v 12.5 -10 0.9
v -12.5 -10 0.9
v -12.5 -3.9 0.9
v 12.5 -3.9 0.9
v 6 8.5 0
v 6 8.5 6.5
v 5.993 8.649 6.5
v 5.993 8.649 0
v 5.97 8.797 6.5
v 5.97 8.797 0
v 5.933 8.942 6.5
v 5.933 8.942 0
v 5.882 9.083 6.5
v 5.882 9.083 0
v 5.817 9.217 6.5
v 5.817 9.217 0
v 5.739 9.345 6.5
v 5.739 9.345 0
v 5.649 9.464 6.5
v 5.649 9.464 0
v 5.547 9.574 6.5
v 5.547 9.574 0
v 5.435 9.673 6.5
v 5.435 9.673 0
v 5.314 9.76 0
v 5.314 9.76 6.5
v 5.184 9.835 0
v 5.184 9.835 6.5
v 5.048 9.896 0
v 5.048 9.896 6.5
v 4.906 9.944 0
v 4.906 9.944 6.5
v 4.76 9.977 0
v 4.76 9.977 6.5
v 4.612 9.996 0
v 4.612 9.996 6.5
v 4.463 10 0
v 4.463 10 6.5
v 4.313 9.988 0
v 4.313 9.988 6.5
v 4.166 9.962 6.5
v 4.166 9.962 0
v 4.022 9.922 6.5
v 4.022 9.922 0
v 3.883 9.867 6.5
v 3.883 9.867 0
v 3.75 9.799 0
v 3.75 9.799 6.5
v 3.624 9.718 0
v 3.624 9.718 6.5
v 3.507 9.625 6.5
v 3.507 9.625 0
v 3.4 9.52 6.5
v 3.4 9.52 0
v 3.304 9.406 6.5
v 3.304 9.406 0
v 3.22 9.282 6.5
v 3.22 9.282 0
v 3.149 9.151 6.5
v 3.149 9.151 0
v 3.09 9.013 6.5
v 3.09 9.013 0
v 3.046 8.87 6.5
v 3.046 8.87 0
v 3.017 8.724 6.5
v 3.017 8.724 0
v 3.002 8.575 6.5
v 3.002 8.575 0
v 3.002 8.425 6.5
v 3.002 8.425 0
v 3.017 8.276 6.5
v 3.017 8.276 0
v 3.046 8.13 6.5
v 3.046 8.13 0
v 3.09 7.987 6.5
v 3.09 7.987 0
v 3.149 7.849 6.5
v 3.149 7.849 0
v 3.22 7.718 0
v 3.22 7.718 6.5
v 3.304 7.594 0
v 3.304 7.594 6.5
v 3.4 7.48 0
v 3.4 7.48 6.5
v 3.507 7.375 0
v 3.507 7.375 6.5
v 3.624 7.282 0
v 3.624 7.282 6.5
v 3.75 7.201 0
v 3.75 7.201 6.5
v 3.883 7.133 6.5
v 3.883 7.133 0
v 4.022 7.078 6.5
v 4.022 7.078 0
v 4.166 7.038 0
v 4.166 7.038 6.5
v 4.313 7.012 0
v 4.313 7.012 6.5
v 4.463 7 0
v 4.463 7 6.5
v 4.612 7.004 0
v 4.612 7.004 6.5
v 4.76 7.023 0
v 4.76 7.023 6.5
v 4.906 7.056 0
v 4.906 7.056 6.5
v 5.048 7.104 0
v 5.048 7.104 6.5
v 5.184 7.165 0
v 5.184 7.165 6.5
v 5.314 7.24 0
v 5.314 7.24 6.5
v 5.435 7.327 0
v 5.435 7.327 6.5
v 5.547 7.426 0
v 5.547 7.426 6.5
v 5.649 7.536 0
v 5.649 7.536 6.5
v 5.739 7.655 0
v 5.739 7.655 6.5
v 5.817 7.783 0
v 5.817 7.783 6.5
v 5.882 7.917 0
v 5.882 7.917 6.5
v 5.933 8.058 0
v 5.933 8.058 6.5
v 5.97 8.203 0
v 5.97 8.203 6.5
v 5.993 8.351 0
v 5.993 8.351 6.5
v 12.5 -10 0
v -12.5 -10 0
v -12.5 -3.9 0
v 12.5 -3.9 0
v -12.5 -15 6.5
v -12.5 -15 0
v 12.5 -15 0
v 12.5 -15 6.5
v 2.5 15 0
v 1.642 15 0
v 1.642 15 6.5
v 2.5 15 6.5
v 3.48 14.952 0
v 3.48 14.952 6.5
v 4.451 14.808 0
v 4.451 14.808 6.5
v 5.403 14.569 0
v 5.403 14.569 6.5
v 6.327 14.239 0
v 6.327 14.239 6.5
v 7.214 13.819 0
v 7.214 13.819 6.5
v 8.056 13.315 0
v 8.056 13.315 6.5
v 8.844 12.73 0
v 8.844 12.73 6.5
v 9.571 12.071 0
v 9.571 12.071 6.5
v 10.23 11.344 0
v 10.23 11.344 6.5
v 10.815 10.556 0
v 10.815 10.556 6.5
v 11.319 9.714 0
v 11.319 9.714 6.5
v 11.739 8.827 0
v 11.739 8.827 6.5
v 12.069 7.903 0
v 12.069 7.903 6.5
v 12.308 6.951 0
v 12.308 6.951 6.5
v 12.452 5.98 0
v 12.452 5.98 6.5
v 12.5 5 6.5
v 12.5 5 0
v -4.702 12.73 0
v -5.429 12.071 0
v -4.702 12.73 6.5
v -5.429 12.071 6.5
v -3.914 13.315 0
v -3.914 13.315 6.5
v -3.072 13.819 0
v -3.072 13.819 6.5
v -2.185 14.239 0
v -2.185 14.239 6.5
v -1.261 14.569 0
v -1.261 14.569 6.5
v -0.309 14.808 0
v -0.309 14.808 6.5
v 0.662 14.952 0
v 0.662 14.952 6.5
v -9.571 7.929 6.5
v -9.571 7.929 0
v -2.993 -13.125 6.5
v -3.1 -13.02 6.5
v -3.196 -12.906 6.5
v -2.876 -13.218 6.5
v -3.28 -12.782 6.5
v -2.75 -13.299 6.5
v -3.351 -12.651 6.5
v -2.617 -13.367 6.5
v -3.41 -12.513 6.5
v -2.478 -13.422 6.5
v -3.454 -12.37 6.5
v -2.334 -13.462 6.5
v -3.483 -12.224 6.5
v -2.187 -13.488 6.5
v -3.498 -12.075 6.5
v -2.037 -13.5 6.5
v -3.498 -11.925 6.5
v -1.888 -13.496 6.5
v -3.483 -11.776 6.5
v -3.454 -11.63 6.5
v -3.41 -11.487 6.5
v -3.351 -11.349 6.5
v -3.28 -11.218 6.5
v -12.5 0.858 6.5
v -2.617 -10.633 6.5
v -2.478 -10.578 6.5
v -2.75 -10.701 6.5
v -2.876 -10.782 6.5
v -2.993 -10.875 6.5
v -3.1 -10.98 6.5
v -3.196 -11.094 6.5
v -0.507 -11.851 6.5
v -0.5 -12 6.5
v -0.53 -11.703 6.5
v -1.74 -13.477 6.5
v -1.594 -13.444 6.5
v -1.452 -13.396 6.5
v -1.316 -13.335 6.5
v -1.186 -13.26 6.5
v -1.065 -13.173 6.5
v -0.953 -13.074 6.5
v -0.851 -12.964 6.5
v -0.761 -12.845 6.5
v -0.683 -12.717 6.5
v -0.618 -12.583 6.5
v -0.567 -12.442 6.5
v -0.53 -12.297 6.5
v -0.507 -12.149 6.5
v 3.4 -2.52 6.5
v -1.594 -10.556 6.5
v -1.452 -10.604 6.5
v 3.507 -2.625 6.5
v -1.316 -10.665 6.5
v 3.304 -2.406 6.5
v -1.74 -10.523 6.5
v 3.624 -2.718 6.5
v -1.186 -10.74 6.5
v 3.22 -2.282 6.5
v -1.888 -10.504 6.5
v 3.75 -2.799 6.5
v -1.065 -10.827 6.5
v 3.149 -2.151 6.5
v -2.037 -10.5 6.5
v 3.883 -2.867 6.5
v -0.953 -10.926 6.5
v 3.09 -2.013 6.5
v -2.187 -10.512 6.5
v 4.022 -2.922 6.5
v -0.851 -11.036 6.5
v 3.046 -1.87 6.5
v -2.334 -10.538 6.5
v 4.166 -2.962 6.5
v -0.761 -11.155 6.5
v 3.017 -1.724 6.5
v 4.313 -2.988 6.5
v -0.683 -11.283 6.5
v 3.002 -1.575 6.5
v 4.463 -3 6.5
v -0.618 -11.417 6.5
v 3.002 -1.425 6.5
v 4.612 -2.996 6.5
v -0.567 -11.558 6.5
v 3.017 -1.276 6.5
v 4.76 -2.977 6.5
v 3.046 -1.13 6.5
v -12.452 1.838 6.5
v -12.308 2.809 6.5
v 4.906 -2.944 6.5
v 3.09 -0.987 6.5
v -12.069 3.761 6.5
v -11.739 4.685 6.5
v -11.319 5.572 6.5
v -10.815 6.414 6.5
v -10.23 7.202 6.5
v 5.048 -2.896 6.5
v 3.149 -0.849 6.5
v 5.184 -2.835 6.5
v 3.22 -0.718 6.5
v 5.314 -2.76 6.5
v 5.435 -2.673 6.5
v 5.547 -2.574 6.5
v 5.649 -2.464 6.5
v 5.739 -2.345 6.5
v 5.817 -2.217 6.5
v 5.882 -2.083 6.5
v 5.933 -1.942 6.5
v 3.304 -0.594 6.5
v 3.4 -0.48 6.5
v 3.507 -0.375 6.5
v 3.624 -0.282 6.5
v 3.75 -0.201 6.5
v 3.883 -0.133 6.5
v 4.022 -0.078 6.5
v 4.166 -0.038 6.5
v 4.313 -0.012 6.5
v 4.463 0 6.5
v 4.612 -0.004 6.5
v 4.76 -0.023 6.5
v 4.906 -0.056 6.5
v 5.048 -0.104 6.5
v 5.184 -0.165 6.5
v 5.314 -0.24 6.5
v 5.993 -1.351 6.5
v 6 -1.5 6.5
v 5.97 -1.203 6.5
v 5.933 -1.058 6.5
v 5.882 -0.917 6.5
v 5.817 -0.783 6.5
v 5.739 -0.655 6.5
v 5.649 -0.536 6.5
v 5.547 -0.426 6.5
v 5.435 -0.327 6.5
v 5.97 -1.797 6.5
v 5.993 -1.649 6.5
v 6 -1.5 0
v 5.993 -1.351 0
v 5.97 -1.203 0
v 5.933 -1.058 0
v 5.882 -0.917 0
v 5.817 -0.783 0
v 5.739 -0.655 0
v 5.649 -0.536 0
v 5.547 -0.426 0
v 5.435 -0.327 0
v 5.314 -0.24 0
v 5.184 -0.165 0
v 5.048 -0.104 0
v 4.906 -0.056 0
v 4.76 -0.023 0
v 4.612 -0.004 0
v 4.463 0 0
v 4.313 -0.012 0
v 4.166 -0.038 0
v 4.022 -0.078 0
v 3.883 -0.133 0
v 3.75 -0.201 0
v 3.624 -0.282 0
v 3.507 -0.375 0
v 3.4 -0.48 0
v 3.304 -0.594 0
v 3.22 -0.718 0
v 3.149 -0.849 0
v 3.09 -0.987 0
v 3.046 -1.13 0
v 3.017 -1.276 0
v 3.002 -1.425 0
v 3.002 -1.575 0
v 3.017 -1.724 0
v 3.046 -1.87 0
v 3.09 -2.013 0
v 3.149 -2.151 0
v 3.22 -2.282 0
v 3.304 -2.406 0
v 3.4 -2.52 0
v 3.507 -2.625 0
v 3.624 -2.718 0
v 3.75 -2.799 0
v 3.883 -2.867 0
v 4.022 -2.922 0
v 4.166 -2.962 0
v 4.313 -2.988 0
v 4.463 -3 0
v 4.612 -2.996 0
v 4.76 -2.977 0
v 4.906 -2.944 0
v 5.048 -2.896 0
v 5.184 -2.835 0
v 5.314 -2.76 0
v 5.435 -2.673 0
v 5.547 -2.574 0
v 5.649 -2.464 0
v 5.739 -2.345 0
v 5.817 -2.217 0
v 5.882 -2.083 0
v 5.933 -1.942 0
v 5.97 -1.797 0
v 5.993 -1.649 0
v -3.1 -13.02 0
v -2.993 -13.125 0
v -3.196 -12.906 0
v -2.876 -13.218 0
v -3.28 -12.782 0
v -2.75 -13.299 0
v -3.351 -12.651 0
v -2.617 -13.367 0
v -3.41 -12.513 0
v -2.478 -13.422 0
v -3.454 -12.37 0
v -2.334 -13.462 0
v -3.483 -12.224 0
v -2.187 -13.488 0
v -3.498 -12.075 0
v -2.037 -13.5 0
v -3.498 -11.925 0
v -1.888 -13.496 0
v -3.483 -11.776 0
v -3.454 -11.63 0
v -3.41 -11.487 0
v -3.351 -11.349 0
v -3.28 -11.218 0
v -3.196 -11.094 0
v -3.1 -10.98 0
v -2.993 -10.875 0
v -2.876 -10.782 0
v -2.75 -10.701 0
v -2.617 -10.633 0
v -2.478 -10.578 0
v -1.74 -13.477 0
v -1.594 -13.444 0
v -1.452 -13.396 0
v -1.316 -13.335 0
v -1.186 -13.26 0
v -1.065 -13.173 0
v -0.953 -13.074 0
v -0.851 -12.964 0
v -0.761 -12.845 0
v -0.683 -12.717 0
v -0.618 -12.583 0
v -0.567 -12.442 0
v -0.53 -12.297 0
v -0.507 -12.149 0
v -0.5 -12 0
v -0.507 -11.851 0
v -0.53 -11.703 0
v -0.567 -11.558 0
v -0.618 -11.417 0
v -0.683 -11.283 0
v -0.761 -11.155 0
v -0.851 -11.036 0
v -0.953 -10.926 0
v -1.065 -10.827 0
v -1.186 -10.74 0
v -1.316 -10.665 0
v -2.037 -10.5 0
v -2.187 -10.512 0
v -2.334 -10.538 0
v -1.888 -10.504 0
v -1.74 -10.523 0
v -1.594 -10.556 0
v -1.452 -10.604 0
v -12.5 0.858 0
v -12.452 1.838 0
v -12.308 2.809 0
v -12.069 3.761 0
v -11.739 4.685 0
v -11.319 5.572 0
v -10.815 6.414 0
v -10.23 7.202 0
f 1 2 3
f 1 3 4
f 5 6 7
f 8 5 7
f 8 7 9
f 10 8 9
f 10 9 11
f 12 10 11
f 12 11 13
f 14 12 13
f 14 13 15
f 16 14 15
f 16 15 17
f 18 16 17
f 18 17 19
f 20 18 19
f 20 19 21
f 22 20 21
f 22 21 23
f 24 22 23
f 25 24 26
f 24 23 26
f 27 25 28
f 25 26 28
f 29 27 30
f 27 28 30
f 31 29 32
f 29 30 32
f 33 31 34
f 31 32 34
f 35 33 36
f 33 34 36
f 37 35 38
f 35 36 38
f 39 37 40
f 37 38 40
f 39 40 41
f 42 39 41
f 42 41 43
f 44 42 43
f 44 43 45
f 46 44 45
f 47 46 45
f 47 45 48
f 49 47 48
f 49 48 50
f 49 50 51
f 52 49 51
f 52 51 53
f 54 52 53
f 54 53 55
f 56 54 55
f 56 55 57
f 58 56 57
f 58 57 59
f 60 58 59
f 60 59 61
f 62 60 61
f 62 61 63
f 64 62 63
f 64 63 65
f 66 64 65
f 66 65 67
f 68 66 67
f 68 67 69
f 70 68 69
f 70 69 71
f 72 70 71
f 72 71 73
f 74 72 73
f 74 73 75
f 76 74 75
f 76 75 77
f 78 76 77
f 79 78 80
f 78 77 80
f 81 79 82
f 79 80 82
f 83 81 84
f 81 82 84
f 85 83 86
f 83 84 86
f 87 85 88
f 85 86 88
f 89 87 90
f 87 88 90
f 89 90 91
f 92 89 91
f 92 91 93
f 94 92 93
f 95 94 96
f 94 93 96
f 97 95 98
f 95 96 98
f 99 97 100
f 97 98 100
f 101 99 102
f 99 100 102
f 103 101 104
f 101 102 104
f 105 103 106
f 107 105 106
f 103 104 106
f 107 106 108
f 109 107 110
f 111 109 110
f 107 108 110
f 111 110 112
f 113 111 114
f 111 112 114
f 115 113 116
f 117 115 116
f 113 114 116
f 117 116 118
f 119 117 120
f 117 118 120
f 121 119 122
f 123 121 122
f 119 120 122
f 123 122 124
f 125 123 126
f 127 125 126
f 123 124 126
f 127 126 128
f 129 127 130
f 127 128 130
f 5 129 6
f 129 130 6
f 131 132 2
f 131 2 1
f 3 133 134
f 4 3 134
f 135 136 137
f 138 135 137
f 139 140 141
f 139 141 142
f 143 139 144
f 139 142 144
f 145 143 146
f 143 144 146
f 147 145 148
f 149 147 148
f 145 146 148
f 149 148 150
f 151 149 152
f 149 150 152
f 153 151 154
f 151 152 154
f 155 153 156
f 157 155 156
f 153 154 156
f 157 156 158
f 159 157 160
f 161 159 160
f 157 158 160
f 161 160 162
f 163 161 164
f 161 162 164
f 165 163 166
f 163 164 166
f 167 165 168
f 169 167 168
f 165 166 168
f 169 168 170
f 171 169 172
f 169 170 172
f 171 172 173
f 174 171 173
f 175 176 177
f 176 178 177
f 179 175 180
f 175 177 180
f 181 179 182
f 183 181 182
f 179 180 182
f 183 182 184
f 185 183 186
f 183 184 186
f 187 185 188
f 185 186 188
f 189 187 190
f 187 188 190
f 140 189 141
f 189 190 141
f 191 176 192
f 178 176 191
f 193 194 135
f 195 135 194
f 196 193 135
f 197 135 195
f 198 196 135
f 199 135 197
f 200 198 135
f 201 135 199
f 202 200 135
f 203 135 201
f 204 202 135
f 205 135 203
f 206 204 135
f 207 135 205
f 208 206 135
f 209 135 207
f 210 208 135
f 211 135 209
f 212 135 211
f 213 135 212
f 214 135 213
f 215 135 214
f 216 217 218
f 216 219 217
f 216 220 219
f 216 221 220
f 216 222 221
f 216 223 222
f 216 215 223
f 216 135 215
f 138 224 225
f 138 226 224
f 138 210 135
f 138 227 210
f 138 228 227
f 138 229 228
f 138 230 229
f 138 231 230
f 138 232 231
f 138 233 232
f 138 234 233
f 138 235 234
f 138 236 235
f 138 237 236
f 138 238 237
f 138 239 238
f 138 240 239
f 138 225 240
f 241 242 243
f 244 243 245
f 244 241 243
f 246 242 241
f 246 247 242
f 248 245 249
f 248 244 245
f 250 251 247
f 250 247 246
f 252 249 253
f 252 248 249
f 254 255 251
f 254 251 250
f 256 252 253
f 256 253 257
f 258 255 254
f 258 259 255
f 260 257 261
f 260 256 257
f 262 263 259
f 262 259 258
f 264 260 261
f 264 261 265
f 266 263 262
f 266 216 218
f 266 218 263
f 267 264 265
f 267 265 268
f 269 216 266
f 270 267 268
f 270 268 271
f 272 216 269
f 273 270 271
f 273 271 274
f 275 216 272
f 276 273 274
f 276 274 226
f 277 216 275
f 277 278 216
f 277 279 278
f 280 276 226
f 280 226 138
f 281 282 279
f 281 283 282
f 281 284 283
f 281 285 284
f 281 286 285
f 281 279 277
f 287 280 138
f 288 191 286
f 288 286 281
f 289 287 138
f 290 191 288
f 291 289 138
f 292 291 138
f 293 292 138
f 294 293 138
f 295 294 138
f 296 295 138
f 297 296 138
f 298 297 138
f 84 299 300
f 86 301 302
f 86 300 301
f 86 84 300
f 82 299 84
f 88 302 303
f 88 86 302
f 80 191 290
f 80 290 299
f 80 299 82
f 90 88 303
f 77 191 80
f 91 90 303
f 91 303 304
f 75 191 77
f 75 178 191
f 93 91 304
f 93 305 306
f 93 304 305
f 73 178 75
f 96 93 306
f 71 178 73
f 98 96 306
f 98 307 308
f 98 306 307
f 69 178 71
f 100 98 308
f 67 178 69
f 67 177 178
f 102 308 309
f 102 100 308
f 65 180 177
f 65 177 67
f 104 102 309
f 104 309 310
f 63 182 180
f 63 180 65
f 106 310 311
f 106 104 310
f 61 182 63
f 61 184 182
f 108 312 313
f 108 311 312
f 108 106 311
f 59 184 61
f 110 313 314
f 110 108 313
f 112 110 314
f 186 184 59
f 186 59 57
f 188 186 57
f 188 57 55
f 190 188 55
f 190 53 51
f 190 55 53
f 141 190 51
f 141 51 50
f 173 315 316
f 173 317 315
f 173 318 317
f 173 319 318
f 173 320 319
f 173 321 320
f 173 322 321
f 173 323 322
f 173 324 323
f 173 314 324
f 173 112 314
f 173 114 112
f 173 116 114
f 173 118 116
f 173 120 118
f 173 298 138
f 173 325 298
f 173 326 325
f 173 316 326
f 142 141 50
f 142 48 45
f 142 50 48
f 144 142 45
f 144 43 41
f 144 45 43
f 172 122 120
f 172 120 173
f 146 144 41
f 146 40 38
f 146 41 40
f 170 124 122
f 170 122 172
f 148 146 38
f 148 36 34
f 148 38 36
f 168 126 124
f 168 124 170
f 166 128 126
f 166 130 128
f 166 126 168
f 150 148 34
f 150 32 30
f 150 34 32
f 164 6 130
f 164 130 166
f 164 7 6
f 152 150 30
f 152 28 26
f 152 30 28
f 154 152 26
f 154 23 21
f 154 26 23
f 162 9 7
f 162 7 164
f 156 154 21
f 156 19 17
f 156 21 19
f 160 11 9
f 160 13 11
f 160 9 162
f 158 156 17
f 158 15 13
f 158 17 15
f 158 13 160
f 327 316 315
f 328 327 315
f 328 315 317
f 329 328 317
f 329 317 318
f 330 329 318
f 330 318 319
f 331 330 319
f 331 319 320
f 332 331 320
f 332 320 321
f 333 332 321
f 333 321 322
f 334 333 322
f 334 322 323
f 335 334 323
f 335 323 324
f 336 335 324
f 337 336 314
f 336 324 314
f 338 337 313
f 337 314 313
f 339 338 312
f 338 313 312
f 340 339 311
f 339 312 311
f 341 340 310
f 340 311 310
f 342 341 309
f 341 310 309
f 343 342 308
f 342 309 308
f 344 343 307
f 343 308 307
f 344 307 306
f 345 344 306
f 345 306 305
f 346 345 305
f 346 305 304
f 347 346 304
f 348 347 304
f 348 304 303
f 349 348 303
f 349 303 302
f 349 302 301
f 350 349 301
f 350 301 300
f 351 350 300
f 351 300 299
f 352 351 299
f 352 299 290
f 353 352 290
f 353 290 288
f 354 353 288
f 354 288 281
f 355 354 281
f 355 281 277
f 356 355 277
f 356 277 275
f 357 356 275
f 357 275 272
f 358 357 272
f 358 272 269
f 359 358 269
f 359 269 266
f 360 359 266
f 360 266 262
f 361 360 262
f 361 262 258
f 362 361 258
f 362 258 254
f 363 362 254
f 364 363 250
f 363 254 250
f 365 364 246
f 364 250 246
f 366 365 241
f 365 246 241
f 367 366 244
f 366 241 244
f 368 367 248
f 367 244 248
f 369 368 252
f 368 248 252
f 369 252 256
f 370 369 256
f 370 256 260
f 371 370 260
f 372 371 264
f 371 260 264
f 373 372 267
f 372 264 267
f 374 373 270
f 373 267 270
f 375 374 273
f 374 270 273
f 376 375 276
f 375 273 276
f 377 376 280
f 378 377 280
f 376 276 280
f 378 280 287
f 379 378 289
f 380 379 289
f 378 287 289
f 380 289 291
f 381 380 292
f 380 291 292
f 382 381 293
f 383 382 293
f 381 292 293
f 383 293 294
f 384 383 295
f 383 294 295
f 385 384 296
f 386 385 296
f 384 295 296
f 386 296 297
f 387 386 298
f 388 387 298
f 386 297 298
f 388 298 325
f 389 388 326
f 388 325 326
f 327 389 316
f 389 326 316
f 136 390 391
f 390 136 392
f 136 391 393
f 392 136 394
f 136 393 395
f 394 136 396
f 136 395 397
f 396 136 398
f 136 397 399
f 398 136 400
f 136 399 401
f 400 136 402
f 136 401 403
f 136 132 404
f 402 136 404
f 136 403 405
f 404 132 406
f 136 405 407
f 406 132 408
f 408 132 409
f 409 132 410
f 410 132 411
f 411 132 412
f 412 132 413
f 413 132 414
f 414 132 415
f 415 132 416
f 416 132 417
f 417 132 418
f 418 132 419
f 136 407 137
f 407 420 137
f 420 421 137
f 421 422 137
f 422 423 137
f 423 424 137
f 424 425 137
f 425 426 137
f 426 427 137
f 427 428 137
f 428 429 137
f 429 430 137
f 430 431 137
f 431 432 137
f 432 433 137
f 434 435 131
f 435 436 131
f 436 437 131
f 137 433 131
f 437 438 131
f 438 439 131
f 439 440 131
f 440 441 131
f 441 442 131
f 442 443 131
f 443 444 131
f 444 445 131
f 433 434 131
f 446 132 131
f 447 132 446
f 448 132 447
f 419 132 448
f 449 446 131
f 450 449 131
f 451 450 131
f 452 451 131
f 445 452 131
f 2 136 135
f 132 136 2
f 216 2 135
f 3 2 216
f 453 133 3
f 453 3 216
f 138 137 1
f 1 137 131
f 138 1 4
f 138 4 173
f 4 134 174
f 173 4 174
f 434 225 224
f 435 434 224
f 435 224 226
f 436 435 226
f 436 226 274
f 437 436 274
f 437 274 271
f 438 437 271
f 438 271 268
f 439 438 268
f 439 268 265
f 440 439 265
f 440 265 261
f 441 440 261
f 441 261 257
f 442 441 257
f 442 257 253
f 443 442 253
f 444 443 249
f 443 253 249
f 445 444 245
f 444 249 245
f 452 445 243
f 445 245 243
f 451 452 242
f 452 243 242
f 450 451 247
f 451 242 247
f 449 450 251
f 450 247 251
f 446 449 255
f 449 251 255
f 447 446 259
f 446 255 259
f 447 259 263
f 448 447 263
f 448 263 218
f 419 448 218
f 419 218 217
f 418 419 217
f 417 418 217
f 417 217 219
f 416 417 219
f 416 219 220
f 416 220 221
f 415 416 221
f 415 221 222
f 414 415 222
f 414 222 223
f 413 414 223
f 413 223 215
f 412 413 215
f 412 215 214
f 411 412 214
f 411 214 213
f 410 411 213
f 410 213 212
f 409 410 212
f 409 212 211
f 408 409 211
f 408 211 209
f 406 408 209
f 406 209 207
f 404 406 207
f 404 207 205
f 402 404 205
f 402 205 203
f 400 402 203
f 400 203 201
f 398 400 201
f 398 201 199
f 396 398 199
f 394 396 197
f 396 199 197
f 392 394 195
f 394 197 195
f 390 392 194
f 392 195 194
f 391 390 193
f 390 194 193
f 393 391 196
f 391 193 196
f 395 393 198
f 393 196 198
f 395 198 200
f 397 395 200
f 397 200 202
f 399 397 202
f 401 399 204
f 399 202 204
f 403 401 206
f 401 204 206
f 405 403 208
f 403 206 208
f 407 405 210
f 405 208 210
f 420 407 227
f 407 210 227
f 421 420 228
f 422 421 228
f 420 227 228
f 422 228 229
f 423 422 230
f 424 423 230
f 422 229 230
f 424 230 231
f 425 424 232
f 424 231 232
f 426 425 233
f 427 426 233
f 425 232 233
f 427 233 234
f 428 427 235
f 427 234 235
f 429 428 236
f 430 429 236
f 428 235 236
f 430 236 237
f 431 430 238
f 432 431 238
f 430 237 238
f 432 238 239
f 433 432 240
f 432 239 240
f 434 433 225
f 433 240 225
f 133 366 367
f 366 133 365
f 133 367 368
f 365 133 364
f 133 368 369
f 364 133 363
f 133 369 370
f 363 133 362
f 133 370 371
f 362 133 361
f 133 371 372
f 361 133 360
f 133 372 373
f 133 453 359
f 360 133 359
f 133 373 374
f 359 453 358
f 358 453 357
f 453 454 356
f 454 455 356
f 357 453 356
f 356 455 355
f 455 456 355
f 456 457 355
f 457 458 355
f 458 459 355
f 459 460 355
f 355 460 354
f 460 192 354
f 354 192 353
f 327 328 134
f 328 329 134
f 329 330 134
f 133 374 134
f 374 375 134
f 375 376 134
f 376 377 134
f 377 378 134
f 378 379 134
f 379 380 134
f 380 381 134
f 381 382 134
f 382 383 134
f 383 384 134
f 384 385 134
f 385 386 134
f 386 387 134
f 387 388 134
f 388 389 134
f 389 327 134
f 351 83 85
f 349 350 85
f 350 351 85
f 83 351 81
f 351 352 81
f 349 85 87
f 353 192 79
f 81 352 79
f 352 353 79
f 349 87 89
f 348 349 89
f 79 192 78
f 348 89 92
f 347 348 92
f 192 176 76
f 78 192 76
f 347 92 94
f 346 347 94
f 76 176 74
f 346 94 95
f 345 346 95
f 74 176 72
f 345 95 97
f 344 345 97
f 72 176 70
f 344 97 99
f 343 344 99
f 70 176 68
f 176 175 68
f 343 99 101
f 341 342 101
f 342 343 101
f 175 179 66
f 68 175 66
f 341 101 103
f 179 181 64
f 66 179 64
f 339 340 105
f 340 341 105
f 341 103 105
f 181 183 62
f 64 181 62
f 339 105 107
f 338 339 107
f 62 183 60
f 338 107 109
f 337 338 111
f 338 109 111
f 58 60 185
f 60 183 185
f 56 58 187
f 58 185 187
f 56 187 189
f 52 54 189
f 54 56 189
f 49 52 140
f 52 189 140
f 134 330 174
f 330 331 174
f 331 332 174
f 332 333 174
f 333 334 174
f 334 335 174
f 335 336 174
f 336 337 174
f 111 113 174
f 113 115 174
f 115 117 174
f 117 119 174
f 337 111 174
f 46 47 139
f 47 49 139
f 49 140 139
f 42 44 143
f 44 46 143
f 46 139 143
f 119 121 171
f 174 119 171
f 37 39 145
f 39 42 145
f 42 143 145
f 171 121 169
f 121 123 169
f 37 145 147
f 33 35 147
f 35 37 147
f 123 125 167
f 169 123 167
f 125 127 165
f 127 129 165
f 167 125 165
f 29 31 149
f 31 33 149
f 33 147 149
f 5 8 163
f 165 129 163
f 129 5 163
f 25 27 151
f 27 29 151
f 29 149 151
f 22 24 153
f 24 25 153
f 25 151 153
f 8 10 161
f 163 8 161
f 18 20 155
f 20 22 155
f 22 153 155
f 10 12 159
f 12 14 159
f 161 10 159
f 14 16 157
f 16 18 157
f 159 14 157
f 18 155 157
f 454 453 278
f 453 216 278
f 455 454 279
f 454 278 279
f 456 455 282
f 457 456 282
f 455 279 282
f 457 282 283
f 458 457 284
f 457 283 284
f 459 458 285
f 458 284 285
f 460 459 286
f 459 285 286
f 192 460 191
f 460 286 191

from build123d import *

# Parameters (mm, degrees)
F0_W     = 25
F0_H     = 30
F1_DEPTH = 6.5
F2_R     = 1.5
F3_DEPTH = 6.501
F4_W     = 25
F4_H     = 6.1
F5_DEPTH = 0.9
F6_SIZE  = 10
F7_R     = 10


with BuildPart() as f1:
    # F0 (on Top) → F1 (new body)
    with BuildSketch(Plane.XY):
        Rectangle(F0_W, F0_H)
    extrude(amount=F1_DEPTH)

    # F2 (on face) → F3 (cut, through all)
    with BuildSketch(Plane.XY.offset(6.5)):
        with Locations((-2, -12)):
            Circle(F2_R)
        with Locations((4.5, -1.5)):
            Circle(F2_R)
        with Locations((4.5, 8.5)):
            Circle(F2_R)
    extrude(amount=-F3_DEPTH, mode=Mode.SUBTRACT)

    # F4 (on face) → F5 (cut)
    with BuildSketch(Plane(origin=(0, 0, 0), x_dir=(1, 0, 0), z_dir=(0, 0, -1))):
        with Locations((0, 6.95)):
            Rectangle(F4_W, F4_H)
    extrude(amount=-F5_DEPTH, mode=Mode.SUBTRACT)

    # F6
    f6_edges = [f1.edges().sort_by_distance(p)[0] for p in [
        (-12.5, 15, 3.25),
    ]]
    chamfer(f6_edges, length=F6_SIZE)

    # F7
    f7_edges = [f1.edges().sort_by_distance(p)[0] for p in [
        (-12.5, 5, 3.25),
        (-2.5, 15, 3.25),
        (12.5, 15, 3.25),
    ]]
    fillet(f7_edges, radius=F7_R)


solid = f1.part
